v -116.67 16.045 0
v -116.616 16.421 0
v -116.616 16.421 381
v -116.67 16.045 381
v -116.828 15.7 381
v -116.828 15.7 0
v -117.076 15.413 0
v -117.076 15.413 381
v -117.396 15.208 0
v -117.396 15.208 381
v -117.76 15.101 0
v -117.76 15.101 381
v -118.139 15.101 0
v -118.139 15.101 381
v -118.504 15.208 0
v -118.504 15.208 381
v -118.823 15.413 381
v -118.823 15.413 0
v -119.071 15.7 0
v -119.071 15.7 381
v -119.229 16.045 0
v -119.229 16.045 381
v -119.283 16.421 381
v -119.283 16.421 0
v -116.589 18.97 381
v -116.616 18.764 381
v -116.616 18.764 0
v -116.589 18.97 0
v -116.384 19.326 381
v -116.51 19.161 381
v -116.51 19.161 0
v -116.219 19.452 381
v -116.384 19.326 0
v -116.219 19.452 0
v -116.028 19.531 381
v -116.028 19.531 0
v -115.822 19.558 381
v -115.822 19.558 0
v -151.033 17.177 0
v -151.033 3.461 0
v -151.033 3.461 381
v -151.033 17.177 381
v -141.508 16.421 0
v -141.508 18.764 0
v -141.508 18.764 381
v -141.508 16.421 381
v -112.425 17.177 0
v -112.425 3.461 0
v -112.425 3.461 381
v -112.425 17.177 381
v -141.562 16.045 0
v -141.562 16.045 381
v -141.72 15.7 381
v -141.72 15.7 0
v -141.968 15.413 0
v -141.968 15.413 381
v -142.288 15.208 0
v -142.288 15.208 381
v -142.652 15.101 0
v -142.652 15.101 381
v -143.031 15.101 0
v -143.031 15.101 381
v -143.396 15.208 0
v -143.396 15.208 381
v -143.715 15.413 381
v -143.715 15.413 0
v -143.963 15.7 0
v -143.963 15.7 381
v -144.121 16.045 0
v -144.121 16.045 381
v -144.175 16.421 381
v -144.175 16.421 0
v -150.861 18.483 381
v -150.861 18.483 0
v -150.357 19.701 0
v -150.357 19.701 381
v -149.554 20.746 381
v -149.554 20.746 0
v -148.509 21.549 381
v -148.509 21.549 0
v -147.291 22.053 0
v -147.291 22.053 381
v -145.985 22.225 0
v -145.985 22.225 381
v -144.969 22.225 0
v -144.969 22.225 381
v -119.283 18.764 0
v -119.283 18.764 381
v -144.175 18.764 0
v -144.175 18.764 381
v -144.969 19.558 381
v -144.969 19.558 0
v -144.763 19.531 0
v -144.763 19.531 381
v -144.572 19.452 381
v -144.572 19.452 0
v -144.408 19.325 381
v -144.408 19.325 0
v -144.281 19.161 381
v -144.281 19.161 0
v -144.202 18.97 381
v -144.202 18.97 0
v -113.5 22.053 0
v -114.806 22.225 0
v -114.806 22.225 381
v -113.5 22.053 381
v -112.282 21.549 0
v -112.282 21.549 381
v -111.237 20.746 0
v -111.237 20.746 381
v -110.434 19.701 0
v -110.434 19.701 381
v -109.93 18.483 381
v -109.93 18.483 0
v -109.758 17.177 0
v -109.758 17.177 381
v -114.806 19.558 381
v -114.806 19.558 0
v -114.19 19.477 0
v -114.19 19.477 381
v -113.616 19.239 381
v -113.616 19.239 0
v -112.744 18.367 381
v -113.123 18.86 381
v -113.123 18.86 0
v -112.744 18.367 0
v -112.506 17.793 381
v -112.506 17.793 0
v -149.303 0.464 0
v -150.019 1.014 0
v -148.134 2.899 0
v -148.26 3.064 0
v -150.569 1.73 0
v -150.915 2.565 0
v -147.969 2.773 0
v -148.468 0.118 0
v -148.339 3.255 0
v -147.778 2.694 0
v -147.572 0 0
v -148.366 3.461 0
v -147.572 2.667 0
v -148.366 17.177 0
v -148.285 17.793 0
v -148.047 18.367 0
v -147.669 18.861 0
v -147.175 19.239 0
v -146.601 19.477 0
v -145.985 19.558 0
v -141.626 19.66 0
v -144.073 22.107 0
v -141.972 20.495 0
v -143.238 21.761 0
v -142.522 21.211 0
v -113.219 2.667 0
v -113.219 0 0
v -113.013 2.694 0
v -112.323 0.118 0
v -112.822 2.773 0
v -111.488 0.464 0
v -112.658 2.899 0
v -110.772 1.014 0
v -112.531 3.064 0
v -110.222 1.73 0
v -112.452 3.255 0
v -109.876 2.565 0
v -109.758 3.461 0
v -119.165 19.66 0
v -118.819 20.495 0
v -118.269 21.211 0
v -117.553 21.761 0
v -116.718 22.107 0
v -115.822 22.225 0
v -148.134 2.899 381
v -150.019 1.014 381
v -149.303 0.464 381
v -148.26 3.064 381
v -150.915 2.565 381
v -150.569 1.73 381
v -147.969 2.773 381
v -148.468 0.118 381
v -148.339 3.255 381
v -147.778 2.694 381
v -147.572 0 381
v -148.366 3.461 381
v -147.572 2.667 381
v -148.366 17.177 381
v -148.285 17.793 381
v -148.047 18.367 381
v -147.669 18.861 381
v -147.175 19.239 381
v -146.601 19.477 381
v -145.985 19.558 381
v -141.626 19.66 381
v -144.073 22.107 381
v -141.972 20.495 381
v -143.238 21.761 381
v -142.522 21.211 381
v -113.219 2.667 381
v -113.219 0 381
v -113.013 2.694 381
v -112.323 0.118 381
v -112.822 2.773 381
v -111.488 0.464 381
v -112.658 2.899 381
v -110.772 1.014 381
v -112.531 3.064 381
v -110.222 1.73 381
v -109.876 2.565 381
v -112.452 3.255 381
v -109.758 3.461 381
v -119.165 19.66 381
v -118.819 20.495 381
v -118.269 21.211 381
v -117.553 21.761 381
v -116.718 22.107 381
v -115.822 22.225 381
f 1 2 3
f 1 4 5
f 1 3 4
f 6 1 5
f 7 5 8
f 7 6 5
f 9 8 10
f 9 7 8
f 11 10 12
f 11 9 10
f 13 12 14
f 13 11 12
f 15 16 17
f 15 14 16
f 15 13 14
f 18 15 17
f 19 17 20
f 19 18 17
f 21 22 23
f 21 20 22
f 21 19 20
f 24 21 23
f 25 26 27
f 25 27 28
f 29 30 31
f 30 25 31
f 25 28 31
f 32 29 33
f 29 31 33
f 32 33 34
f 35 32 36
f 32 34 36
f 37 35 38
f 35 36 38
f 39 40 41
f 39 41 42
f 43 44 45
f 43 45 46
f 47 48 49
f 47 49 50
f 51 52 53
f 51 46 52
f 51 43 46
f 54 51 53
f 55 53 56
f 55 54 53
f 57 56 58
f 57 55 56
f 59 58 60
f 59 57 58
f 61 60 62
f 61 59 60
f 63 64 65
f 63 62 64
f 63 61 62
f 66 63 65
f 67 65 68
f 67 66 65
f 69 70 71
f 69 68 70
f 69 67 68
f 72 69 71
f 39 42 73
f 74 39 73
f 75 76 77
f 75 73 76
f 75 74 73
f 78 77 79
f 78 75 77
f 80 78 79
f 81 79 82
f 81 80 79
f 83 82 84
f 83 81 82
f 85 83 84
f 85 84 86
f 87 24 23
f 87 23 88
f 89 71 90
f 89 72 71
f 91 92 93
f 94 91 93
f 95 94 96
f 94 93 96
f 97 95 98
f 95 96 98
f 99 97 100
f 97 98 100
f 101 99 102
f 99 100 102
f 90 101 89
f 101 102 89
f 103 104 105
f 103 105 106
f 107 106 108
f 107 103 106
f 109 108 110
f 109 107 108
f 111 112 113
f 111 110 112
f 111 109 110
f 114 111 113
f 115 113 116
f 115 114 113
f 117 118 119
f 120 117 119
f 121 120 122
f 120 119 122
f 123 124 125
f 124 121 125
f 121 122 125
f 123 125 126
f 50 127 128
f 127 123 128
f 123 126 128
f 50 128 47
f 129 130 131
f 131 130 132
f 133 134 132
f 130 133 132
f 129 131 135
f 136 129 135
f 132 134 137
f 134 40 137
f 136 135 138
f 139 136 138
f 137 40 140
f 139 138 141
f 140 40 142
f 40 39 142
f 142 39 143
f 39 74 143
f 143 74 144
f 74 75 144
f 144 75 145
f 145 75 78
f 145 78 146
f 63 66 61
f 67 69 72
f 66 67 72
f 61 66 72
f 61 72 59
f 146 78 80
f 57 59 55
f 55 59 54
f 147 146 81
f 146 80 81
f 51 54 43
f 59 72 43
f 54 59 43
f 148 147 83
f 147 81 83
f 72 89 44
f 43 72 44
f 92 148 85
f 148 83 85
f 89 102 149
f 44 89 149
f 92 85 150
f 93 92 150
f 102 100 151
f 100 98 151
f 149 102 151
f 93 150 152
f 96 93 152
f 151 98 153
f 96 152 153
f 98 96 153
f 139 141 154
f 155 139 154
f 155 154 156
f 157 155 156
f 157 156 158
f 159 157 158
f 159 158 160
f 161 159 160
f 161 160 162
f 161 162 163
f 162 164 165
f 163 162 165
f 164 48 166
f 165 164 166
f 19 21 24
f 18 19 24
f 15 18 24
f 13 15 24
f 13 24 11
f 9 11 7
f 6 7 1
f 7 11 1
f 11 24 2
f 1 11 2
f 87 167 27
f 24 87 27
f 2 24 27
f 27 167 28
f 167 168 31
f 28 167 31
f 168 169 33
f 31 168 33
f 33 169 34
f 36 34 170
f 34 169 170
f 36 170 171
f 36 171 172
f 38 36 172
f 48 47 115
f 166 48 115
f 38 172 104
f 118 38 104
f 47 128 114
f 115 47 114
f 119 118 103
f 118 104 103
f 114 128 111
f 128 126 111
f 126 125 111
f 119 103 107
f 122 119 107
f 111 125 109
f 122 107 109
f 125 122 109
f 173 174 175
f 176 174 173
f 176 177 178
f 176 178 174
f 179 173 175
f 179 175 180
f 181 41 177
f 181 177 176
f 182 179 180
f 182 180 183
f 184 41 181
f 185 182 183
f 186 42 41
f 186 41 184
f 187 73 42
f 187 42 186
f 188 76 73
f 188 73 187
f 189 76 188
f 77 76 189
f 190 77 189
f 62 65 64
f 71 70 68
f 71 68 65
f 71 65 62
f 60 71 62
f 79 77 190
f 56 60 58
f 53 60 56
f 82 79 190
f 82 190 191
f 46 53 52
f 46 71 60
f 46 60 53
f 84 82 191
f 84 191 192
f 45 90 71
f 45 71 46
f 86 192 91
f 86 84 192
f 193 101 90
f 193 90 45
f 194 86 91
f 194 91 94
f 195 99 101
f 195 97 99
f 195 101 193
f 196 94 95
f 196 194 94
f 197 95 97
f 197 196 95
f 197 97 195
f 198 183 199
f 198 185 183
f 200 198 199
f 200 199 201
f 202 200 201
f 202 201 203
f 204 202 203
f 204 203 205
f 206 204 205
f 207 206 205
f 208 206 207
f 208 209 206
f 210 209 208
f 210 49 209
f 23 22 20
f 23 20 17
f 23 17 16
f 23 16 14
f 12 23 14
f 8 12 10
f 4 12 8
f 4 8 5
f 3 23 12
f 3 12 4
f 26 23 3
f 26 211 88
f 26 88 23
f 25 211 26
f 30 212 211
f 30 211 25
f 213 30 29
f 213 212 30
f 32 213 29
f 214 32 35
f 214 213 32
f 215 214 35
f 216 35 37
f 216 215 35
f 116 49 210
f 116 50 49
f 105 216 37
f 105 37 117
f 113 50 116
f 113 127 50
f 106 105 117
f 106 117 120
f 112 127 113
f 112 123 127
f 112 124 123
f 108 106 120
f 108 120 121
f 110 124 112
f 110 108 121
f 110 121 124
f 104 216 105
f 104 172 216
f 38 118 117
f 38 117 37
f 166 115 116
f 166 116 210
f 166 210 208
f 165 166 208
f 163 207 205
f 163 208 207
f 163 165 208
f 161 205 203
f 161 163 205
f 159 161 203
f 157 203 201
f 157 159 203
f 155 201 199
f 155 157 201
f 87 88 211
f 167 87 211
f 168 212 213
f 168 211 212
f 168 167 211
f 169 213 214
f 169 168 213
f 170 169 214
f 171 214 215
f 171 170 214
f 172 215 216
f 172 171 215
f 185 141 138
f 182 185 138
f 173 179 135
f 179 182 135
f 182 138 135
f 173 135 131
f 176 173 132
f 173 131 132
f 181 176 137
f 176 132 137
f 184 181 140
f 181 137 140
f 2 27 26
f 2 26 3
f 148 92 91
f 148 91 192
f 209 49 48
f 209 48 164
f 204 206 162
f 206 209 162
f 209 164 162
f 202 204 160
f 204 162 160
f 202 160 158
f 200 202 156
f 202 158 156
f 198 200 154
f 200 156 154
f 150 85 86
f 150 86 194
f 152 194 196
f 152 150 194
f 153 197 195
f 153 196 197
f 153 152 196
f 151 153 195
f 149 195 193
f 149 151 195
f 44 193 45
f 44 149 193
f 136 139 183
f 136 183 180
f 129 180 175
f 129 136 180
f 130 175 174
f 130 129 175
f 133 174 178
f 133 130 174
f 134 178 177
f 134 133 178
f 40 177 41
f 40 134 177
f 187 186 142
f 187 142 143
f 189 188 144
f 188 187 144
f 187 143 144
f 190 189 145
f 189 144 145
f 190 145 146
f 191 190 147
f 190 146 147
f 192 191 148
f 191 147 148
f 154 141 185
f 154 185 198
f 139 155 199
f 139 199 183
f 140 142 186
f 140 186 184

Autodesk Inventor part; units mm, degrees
ref_plane "YZ Plane" through (0, 0, 0) normal (1, 0, 0) x (0, 1, 0)
ref_plane "XZ Plane" through (0, 0, 0) normal (0, 1, 0) x (-1, 0, 0)
ref_plane "Work Plane1" through (0, 0, 0) normal (0, 0, 1) x (1, 0, 0)
sketch "Sketch1" plane through (0, 0, 0) normal (0, 0, 1) x (1, 0, 0)
  arc A0 (-113.2188, 0) -> (-109.7581, 3.4607) centre (-113.2188, 3.4607) ccw projected
  line L0 (-109.7581, 17.1767) -> (-109.7581, 3.4607) projected
  arc A1 (-109.7581, 17.1767) -> (-114.8063, 22.225) centre (-114.8063, 17.1767) ccw projected
  line L1 (-115.8223, 22.225) -> (-114.8063, 22.225) projected
  arc A2 (-115.8223, 22.225) -> (-119.2831, 18.7642) centre (-115.8223, 18.7642) ccw projected
  line L2 (-119.2831, 16.4211) -> (-119.2831, 18.7642) projected
  arc A3 (-119.2831, 16.4211) -> (-116.6161, 16.4211) centre (-117.9496, 16.4211) ccw projected
  line L3 (-116.6161, 18.7642) -> (-116.6161, 16.4211) projected
  arc A4 (-115.8223, 19.558) -> (-116.6161, 18.7642) centre (-115.8223, 18.7642) ccw projected
  line L4 (-114.8063, 19.558) -> (-115.8223, 19.558) projected
  arc A5 (-112.4251, 17.1767) -> (-114.8063, 19.558) centre (-114.8063, 17.1767) ccw projected
  line L5 (-112.4251, 3.4607) -> (-112.4251, 17.1767) projected
  arc A6 (-113.2188, 2.667) -> (-112.4251, 3.4607) centre (-113.2188, 3.4607) ccw projected
  line L6 (-147.5723, 2.667) -> (-113.2188, 2.667) projected
  arc A7 (-148.3661, 3.4607) -> (-147.5723, 2.667) centre (-147.5723, 3.4607) ccw projected
  line L7 (-148.3661, 17.1767) -> (-148.3661, 3.4607) projected
  arc A8 (-145.9848, 19.558) -> (-148.3661, 17.1767) centre (-145.9848, 17.1767) ccw projected
  line L8 (-144.9688, 19.558) -> (-145.9848, 19.558) projected
  arc A9 (-144.1751, 18.7642) -> (-144.9688, 19.558) centre (-144.9688, 18.7642) ccw projected
  line L9 (-144.1751, 16.4211) -> (-144.1751, 18.7642) projected
  arc A10 (-144.1751, 16.4211) -> (-141.5081, 16.4211) centre (-142.8416, 16.4211) ccw projected
  line L10 (-141.5081, 18.7642) -> (-141.5081, 16.4211) projected
  arc A11 (-141.5081, 18.7642) -> (-144.9688, 22.225) centre (-144.9688, 18.7642) ccw projected
  line L11 (-145.9848, 22.225) -> (-144.9688, 22.225) projected
  arc A12 (-145.9848, 22.225) -> (-151.0331, 17.1767) centre (-145.9848, 17.1767) ccw projected
  line L12 (-151.0331, 3.4607) -> (-151.0331, 17.1767) projected
  arc A13 (-151.0331, 3.4607) -> (-147.5723, 0) centre (-147.5723, 3.4607) ccw projected
  line L13 (-113.2188, 0) -> (-147.5723, 0) projected
  point P0 (0, 0)
extrude "Extrusion1" add sketch "Sketch1" along normal blind 381
properties part number "Unistrut 15"
